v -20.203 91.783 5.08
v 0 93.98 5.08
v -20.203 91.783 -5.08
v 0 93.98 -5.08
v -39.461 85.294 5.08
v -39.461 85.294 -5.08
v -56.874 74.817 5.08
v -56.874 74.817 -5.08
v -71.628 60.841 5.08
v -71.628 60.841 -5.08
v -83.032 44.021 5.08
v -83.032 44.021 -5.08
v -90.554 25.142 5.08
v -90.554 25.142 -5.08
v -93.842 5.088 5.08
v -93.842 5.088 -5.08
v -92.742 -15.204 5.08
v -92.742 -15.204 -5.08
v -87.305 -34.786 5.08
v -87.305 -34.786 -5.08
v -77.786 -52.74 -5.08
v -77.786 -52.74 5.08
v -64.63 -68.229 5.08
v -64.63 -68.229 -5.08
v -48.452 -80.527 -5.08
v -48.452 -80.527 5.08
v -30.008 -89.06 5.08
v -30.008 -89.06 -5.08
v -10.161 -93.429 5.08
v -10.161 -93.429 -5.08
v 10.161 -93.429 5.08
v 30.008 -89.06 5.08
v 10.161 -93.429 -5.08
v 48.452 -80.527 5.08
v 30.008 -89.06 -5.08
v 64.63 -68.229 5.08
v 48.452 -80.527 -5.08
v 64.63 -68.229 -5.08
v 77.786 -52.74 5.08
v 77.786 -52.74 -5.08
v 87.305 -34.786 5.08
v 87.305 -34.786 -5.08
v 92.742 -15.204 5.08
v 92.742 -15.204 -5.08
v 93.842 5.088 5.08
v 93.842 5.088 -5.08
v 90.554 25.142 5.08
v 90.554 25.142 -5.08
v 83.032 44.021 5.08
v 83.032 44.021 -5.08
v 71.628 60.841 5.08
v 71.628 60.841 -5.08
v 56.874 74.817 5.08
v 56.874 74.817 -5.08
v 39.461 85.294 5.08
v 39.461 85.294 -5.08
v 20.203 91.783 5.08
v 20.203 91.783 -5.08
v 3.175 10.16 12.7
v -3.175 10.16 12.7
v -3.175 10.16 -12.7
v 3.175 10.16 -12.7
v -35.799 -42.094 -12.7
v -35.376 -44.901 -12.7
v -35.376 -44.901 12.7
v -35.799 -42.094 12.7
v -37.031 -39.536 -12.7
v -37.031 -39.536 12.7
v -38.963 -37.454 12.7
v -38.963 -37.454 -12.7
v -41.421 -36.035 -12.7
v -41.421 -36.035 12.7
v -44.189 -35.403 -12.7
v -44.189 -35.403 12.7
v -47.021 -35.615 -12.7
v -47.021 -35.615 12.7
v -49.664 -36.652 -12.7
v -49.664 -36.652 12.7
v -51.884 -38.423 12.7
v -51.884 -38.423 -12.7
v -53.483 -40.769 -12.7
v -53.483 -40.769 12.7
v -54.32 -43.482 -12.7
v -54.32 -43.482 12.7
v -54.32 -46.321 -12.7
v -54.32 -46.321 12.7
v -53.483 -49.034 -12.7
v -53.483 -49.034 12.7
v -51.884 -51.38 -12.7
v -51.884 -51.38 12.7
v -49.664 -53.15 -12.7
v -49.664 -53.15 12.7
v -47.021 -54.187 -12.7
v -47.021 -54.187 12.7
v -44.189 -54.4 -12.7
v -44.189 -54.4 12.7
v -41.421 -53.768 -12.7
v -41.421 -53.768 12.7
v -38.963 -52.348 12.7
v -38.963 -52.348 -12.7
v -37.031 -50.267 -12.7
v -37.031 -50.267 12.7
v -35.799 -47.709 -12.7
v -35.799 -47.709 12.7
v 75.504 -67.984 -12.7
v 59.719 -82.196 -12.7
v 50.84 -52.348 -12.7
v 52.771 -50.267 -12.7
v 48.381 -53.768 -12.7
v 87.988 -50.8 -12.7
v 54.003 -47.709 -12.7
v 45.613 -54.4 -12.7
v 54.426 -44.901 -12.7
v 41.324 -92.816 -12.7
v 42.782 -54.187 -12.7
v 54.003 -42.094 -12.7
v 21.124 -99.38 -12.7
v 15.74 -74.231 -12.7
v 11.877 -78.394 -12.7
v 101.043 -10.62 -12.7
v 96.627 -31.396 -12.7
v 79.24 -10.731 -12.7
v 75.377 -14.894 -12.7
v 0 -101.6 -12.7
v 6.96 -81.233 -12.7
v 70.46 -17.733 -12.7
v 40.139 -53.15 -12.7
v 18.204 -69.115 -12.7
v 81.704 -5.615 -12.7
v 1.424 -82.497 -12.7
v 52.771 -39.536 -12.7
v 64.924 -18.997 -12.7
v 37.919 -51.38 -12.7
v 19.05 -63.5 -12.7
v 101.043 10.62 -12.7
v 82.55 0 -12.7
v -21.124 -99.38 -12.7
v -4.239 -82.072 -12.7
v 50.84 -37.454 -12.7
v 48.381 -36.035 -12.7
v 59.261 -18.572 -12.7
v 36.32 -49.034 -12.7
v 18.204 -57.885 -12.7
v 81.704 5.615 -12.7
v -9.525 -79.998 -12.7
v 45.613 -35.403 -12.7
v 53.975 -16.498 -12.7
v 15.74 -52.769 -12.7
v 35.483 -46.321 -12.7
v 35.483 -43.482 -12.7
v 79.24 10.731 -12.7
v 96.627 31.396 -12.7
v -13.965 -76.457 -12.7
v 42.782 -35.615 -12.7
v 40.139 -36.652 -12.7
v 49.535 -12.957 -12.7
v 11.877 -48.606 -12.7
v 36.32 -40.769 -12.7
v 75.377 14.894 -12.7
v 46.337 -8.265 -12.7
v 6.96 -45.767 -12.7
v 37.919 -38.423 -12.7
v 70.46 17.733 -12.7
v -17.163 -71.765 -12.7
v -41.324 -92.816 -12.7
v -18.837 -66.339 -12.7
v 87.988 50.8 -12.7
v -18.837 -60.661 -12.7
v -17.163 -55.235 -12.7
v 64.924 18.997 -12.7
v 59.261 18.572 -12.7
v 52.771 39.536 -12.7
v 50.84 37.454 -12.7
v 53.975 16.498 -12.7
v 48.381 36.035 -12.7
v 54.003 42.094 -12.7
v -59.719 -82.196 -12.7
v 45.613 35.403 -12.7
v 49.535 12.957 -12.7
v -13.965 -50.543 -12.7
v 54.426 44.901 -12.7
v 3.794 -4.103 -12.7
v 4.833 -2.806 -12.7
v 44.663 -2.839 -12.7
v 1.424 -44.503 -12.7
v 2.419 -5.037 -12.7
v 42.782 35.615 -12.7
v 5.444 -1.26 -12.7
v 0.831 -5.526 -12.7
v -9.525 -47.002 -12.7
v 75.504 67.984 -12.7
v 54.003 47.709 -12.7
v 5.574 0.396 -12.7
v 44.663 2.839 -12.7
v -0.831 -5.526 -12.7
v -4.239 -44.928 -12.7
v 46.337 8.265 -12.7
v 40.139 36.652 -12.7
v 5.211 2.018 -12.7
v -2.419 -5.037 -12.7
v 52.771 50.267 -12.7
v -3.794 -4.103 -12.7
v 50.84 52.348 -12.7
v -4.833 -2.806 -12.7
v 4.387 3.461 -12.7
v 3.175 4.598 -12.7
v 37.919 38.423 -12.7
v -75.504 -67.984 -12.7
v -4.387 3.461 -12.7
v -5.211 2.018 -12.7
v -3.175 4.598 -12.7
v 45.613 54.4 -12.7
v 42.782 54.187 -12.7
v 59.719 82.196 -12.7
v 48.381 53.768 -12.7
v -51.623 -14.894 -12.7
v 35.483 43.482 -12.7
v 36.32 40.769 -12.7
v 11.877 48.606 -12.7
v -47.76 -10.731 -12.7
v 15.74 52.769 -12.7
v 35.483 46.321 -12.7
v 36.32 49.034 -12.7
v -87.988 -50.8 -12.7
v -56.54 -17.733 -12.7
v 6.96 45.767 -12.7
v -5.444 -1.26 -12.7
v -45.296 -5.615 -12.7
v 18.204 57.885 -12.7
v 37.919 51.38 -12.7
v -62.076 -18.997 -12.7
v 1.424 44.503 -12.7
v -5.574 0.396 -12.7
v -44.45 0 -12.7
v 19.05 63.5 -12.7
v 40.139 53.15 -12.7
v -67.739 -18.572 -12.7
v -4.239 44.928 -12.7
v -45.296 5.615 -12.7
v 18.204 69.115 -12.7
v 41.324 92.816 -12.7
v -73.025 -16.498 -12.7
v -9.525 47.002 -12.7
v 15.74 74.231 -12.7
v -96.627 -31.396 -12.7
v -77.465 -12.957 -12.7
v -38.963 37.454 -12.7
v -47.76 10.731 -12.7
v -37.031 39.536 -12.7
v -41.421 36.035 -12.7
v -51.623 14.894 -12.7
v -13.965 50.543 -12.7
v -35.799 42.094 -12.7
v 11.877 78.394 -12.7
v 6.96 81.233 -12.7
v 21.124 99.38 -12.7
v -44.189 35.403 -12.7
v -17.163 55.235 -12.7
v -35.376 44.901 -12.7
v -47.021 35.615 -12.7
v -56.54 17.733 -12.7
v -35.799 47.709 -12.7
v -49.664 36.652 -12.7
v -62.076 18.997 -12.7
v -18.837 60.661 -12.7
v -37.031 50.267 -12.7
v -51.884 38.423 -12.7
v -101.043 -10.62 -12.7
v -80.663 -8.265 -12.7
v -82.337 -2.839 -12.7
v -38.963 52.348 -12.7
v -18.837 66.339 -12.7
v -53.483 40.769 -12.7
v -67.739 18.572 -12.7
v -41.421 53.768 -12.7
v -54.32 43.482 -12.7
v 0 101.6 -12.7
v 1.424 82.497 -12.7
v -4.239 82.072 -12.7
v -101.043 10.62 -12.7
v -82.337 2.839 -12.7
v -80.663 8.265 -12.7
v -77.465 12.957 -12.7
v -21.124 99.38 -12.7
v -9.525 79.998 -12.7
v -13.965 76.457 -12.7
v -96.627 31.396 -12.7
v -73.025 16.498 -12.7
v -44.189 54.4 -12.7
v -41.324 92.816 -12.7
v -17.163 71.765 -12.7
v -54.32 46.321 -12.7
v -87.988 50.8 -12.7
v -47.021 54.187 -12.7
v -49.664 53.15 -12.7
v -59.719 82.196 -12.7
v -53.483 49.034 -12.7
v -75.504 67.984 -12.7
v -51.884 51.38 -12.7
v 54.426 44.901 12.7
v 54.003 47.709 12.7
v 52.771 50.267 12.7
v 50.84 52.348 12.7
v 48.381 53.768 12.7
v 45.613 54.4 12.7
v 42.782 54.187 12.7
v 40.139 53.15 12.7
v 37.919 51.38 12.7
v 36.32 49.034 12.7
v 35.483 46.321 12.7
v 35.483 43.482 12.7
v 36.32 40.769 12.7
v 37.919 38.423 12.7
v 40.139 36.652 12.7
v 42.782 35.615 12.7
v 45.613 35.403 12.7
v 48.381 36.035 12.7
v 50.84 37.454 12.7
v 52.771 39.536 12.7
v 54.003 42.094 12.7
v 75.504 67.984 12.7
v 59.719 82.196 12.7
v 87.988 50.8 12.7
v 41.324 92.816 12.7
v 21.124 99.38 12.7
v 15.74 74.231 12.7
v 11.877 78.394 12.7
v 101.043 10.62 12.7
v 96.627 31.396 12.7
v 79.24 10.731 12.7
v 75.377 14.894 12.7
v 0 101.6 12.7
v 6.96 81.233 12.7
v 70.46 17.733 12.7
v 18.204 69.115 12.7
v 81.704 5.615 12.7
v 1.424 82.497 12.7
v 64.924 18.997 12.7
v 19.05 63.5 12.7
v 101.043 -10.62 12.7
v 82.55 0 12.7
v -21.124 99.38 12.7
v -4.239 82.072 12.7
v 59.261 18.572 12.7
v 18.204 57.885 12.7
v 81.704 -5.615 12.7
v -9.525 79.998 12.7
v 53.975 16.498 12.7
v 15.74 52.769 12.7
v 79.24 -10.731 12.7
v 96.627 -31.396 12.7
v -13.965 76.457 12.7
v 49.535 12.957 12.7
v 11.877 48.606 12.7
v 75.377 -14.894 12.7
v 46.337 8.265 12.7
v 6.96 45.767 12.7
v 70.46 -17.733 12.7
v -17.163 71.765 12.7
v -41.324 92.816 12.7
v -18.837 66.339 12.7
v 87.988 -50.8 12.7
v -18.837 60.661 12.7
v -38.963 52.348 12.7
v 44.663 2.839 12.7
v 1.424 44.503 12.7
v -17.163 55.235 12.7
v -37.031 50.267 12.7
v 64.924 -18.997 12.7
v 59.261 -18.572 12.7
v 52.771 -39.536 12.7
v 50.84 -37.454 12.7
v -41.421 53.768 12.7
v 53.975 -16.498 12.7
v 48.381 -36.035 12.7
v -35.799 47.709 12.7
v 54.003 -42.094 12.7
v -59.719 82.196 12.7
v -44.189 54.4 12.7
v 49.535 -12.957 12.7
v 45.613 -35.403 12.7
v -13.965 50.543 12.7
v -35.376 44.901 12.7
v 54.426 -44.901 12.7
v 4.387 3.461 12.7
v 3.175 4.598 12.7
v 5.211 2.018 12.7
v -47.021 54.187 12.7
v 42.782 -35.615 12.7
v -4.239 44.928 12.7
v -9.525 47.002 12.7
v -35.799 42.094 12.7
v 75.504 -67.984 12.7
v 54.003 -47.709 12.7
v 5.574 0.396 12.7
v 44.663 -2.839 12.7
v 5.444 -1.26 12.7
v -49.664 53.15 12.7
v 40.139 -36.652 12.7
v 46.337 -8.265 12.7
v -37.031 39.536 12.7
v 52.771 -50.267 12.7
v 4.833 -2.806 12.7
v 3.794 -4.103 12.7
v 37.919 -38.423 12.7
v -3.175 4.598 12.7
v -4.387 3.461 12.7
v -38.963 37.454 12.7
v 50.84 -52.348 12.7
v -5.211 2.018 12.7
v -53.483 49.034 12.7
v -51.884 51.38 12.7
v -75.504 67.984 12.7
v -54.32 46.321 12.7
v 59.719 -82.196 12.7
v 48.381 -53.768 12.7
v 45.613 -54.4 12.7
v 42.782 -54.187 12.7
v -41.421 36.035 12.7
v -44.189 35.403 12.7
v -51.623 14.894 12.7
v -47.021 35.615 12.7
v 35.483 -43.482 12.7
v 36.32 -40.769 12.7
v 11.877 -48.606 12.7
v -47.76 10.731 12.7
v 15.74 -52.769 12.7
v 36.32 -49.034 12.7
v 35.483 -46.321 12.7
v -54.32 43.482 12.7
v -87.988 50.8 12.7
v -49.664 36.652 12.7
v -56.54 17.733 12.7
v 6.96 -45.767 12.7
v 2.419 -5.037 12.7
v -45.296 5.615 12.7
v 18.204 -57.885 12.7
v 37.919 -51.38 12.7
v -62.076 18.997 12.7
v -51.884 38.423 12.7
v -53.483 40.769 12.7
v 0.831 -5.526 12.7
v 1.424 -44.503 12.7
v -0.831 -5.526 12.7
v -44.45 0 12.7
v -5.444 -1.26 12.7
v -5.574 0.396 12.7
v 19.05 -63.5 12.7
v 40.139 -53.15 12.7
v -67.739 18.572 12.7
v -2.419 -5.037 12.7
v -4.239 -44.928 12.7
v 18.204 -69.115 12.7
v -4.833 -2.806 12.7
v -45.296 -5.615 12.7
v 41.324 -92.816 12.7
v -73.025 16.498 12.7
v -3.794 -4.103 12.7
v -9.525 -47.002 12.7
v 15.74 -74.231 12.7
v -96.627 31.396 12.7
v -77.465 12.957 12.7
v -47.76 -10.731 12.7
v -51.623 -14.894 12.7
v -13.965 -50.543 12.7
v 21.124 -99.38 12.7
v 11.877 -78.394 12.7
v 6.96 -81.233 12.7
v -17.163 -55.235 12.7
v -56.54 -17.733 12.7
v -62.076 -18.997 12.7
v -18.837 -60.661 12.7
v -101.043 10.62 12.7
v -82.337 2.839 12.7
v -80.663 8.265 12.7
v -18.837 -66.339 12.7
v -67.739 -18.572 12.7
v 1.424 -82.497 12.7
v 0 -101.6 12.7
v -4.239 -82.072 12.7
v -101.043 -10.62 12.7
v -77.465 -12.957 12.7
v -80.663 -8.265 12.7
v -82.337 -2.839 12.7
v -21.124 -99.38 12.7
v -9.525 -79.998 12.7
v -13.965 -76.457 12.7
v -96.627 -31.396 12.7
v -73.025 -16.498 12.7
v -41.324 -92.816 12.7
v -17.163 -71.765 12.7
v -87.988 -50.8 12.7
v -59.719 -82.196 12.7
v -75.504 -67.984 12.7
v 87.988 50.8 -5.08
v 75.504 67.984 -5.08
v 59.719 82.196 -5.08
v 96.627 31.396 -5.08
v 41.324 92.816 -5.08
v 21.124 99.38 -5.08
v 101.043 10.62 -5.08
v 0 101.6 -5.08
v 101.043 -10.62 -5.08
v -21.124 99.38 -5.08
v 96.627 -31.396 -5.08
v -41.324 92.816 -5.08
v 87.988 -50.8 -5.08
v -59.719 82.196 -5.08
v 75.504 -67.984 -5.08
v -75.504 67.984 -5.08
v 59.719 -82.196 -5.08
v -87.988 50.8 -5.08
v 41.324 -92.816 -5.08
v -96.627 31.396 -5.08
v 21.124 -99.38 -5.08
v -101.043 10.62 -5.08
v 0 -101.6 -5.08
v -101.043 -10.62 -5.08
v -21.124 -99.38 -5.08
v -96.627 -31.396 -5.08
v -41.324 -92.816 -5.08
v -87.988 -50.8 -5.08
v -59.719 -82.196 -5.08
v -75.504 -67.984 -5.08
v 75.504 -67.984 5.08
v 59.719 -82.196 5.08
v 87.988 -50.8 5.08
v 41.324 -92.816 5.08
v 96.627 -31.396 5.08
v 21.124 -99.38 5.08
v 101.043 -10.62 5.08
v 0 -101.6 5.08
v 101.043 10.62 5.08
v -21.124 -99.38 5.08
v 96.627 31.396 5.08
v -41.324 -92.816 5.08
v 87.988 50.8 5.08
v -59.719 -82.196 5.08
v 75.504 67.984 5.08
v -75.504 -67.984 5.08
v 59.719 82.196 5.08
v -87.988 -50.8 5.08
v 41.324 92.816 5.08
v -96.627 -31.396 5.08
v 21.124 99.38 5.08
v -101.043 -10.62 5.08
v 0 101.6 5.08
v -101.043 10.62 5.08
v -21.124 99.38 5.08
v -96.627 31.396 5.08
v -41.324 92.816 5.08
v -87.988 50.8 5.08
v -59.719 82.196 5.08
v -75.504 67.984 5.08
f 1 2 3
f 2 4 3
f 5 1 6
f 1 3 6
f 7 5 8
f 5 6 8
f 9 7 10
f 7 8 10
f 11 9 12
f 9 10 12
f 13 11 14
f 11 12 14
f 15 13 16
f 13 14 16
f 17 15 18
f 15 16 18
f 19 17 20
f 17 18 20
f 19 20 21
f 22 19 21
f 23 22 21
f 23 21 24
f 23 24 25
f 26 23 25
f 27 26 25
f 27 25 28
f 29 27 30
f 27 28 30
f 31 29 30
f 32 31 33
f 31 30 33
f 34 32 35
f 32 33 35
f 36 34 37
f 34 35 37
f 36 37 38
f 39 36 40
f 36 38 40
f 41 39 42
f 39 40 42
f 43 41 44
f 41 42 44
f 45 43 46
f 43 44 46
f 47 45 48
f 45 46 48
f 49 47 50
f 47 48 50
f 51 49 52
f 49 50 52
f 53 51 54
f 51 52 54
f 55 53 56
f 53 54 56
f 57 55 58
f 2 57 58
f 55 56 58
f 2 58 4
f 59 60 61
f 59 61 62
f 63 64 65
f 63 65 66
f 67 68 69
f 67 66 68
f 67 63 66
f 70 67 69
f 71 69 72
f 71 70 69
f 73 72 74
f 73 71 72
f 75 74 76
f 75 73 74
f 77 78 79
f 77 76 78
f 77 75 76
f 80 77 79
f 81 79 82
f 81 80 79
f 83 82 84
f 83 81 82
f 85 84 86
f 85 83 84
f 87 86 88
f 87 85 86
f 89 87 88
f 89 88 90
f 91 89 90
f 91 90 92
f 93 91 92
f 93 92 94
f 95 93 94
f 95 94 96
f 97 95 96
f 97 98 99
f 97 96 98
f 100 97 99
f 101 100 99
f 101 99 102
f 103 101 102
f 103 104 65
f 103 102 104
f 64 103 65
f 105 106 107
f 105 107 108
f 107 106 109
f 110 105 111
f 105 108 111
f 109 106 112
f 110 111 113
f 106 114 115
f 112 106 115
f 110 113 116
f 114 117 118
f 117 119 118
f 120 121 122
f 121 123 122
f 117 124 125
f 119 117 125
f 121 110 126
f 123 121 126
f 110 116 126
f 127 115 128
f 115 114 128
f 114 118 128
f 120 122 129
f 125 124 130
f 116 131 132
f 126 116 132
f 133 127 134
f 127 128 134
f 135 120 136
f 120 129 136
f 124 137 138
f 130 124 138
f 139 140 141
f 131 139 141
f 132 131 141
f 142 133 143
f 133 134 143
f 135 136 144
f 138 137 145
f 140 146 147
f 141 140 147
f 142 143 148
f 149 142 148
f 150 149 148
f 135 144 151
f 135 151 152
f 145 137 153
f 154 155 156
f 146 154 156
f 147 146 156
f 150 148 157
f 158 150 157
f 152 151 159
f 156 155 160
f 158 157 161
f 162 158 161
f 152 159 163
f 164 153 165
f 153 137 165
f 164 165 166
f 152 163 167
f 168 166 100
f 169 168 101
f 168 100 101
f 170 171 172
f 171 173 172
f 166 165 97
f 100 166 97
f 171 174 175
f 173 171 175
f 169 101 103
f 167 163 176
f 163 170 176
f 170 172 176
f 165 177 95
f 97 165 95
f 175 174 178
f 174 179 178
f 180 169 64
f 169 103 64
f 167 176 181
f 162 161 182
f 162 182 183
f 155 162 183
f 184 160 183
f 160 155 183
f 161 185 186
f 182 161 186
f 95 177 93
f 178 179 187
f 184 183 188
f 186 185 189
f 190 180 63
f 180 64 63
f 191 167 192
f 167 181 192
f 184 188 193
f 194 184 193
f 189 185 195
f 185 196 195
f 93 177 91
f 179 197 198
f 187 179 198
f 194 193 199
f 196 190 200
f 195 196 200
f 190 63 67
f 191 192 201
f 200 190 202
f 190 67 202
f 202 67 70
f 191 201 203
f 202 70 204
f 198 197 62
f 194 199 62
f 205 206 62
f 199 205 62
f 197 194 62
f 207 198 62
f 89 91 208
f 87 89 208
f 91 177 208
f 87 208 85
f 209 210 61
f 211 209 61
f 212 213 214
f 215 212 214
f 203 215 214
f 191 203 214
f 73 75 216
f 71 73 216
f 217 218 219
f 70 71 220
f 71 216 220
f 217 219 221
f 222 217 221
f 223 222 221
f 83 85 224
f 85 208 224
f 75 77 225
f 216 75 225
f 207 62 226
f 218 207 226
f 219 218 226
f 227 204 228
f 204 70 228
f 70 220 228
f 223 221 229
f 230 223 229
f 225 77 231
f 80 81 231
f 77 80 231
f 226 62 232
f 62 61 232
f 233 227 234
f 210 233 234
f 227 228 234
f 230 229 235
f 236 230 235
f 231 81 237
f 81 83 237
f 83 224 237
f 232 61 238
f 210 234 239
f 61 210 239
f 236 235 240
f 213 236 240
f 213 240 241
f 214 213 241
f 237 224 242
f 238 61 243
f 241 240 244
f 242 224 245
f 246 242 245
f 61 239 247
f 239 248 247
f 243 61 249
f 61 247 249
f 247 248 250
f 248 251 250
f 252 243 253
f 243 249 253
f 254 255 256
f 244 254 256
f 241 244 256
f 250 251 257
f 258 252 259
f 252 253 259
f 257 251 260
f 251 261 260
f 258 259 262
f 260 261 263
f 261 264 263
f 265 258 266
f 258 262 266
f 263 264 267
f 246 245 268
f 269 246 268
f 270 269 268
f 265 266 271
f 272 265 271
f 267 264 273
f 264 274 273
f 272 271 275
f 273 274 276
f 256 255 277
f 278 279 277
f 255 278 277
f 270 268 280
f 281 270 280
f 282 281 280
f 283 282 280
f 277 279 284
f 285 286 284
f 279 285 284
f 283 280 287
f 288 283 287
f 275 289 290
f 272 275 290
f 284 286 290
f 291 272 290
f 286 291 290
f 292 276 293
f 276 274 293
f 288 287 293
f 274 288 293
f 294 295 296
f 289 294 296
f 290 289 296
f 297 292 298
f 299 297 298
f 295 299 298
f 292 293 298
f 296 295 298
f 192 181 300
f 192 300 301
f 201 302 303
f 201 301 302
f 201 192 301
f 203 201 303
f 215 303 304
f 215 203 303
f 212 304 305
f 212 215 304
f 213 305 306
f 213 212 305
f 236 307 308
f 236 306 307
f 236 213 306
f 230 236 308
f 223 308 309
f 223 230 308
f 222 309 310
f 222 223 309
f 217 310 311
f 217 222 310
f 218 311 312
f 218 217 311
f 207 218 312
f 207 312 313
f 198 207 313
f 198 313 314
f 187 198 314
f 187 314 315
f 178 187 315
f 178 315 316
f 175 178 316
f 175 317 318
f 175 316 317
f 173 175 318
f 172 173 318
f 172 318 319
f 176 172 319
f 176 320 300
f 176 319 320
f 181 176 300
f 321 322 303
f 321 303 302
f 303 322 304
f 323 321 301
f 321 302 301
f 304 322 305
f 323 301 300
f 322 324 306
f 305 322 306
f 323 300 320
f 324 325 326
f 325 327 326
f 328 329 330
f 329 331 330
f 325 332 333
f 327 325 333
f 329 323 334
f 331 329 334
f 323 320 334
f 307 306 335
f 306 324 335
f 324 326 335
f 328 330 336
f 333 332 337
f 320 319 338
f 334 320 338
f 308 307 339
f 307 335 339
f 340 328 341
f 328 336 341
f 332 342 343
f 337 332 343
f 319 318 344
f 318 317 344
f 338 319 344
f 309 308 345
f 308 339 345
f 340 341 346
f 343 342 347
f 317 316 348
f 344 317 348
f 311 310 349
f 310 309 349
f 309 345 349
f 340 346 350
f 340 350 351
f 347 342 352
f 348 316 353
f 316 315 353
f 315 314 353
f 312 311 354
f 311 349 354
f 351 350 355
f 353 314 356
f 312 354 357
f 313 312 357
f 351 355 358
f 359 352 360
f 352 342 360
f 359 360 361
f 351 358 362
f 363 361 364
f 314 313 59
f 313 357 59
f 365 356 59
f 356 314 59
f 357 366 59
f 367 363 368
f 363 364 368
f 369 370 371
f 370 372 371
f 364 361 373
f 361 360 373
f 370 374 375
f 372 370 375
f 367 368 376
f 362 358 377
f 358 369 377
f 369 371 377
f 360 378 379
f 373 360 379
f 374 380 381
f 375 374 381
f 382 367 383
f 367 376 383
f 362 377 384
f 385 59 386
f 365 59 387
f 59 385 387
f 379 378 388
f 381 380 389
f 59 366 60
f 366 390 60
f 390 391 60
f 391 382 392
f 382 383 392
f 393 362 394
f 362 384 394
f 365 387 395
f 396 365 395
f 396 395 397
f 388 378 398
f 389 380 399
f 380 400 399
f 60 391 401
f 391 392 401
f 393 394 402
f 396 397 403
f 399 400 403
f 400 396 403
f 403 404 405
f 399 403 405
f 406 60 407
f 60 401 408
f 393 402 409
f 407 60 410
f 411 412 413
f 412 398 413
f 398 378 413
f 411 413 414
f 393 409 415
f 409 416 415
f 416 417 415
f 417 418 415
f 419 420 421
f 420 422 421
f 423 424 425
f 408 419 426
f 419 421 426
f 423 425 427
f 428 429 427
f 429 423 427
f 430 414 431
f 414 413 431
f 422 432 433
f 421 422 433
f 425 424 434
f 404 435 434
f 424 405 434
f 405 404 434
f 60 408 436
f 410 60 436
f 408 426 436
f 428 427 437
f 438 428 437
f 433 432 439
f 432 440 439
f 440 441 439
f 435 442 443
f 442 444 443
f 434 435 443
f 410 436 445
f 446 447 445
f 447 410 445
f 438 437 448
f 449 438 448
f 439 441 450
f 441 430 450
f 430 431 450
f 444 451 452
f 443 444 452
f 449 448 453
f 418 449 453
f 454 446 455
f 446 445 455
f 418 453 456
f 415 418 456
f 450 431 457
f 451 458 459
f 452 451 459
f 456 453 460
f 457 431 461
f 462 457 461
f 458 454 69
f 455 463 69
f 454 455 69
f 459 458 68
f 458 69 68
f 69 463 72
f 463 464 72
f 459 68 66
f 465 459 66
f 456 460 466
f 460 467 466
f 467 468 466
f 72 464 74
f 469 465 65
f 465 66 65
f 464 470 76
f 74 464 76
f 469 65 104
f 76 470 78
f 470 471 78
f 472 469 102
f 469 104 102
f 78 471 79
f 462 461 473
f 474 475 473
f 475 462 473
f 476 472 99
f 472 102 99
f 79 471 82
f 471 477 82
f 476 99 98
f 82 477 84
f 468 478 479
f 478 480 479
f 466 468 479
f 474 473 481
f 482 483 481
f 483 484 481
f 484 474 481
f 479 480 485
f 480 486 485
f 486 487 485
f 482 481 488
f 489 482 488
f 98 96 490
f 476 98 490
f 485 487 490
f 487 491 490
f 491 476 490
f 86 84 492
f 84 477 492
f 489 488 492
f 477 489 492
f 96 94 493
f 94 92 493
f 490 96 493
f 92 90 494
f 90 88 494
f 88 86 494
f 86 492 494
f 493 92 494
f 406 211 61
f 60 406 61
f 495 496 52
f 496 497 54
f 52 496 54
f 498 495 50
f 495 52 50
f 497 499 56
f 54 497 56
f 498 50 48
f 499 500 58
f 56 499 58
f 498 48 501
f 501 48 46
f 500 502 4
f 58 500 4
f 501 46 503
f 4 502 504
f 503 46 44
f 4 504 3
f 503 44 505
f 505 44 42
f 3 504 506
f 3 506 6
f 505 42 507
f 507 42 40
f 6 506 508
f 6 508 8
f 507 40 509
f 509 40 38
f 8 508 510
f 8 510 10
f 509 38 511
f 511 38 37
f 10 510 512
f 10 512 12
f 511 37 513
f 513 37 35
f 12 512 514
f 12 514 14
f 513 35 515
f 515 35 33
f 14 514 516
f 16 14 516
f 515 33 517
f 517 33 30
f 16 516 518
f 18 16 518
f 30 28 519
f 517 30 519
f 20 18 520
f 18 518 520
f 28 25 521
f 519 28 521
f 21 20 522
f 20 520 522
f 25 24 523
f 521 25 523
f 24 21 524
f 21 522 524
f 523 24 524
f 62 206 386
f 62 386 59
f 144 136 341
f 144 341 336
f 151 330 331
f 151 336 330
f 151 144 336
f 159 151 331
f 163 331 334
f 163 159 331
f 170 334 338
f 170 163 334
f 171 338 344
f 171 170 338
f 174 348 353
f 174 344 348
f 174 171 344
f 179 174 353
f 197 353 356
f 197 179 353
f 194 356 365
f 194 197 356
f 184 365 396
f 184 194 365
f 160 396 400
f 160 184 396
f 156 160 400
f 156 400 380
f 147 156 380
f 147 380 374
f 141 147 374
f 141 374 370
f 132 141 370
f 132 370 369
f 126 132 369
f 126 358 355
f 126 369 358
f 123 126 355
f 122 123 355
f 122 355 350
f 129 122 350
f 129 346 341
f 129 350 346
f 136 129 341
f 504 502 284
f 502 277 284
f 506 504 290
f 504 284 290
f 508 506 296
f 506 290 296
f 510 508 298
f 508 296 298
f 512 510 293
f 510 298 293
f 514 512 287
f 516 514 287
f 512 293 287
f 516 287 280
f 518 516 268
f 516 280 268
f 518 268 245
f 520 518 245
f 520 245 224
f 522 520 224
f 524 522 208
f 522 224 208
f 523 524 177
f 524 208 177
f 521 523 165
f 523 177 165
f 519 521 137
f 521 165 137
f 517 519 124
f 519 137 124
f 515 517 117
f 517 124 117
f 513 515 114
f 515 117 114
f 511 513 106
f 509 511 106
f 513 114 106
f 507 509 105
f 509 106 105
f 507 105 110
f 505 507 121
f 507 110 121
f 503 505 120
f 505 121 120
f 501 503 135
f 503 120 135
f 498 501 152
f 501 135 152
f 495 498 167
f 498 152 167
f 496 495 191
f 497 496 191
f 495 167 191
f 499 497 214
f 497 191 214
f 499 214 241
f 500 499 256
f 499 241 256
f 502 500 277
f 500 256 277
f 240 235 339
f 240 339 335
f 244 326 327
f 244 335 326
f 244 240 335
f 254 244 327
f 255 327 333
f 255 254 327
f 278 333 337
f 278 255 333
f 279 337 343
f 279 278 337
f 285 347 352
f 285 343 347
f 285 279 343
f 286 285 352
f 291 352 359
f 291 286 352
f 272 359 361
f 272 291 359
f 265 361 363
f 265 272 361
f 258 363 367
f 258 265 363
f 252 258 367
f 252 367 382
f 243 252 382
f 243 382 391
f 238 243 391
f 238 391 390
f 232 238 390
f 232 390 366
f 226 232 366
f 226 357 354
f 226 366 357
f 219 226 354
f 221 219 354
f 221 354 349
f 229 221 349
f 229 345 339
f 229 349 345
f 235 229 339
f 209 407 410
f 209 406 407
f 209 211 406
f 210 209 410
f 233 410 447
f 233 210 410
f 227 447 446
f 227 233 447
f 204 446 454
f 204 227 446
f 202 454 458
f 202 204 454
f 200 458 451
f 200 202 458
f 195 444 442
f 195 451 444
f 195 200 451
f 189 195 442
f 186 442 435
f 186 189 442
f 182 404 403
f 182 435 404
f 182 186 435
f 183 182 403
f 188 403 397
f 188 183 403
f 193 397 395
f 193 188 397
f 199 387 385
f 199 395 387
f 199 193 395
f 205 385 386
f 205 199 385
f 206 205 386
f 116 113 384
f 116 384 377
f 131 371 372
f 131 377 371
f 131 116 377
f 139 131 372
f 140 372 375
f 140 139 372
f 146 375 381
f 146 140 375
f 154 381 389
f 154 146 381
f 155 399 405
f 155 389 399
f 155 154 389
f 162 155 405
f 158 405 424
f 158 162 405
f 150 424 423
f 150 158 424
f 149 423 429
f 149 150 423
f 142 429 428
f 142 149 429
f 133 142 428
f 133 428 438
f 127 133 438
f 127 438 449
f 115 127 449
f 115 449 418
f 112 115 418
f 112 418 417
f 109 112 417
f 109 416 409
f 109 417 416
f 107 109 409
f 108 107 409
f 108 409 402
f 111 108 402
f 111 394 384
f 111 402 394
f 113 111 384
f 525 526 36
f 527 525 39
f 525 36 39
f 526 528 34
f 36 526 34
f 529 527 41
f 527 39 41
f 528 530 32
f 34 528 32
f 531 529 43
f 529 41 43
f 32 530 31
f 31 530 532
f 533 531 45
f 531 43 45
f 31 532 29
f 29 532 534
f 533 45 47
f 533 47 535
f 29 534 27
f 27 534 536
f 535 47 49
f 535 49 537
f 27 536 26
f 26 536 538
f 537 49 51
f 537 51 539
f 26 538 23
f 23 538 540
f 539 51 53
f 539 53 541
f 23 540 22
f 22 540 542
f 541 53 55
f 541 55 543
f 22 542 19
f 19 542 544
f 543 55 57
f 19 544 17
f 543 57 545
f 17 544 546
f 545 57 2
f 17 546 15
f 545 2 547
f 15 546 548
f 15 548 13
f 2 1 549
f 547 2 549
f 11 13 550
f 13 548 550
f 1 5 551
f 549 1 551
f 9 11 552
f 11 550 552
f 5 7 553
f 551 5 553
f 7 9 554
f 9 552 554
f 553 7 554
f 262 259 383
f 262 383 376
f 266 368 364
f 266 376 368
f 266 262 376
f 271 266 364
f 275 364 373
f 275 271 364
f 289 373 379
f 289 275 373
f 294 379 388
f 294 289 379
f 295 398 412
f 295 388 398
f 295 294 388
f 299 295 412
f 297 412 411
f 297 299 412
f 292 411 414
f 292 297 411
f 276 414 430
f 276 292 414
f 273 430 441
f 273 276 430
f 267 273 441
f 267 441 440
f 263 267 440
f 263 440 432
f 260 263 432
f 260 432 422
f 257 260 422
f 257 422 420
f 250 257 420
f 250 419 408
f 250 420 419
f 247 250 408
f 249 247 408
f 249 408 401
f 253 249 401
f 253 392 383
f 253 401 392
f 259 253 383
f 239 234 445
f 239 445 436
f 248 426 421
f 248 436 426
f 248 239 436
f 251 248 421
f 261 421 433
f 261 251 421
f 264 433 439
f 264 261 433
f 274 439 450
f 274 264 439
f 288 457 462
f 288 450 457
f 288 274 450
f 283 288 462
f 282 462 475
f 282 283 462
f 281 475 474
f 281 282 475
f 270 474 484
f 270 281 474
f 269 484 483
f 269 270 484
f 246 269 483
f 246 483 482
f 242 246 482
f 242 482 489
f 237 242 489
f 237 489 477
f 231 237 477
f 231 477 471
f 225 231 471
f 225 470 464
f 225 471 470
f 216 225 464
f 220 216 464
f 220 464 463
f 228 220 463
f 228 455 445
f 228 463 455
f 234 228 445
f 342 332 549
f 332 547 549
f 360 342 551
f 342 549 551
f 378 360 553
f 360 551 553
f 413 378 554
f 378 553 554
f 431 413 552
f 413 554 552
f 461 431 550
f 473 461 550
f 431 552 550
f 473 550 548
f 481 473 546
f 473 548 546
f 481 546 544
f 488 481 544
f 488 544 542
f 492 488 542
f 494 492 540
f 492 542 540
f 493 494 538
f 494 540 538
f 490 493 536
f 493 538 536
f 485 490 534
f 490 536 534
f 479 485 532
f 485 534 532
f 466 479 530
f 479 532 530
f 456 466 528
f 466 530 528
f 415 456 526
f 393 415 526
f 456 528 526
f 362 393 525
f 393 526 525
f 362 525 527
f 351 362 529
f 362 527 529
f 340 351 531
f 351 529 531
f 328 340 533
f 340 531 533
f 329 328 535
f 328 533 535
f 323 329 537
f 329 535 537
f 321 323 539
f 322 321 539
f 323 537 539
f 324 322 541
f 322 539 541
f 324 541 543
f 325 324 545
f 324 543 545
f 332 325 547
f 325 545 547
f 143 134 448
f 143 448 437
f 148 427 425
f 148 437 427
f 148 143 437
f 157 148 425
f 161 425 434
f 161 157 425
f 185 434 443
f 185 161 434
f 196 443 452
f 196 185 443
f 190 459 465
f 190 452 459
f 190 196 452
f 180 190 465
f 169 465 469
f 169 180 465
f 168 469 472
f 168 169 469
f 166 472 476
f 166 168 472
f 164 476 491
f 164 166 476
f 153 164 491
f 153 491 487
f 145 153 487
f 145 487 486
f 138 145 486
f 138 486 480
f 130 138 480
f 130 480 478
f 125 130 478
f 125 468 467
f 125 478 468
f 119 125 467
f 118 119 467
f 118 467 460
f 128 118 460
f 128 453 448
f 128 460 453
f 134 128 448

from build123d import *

# Parameters (mm, degrees)
CUT_EXTRUDE1_DEPTH      = 145.244271983
CUT_EXTRUDE1_DEPTH_BACK = 145.244271983
SKETCH5_R               = 19.05
SKETCH5_R_2             = 9.525
CUT_EXTRUDE5_DEPTH      = 145.244271983
CUT_EXTRUDE5_DEPTH_BACK = 145.244271983
SKETCH6_R               = 5.588
CUT_EXTRUDE6_DEPTH      = 145.244271983
CUT_EXTRUDE6_DEPTH_BACK = 145.244271983
SKETCH8_W               = 6.35
SKETCH8_H               = 5.561617784


with BuildPart() as part:
    # Sketch1 → Revolve2 (revolve)
    with BuildSketch(Plane(origin=(0, 0, 0), x_dir=(0, 0, -1), z_dir=(1, 0, 0))):
        Polygon((0, 0), (-12.7, 0), (-12.7, 101.6), (-5.08, 101.6), (-5.08, 93.98), (5.08, 93.98), (5.08, 101.6), (12.7, 101.6), (12.7, 0), align=None)
    revolve(axis=Axis((0, 0, 0), (0, 0, 1)))

    # Sketch5 → Cut-Extrude1 (cut, two sides: drawn at the far end of the back side and taken through both)
    with BuildSketch(Plane.XY.offset(-CUT_EXTRUDE1_DEPTH_BACK)):
        with Locations((0, -63.5)):
            Circle(SKETCH5_R)
        with Locations((44.901280605, -44.901280605)):
            Circle(SKETCH5_R_2)
        with Locations((-63.5, 0)):
            Circle(SKETCH5_R)
        with Locations((-44.901280605, -44.901280605)):
            Circle(SKETCH5_R_2)
        with Locations((0, 63.5)):
            Circle(SKETCH5_R)
        with Locations((-44.901280605, 44.901280605)):
            Circle(SKETCH5_R_2)
        with Locations((63.5, 0)):
            Circle(SKETCH5_R)
        with Locations((44.901280605, 44.901280605)):
            Circle(SKETCH5_R_2)
    extrude(amount=CUT_EXTRUDE1_DEPTH + CUT_EXTRUDE1_DEPTH_BACK, mode=Mode.SUBTRACT)

    # Sketch6 → Cut-Extrude5 (cut, two sides: drawn at the far end of the back side and taken through both)
    with BuildSketch(Plane.XY.offset(-CUT_EXTRUDE5_DEPTH_BACK)):
        Circle(SKETCH6_R)
    extrude(amount=CUT_EXTRUDE5_DEPTH + CUT_EXTRUDE5_DEPTH_BACK, mode=Mode.SUBTRACT)

    # Sketch8 → Cut-Extrude6 (cut, two sides: drawn at the far end of the back side and taken through both)
    with BuildSketch(Plane.XY.offset(-CUT_EXTRUDE6_DEPTH_BACK)):
        with Locations((0, 7.379191108)):
            Rectangle(SKETCH8_W, SKETCH8_H)
    extrude(amount=CUT_EXTRUDE6_DEPTH + CUT_EXTRUDE6_DEPTH_BACK, mode=Mode.SUBTRACT)


solid = part.part
